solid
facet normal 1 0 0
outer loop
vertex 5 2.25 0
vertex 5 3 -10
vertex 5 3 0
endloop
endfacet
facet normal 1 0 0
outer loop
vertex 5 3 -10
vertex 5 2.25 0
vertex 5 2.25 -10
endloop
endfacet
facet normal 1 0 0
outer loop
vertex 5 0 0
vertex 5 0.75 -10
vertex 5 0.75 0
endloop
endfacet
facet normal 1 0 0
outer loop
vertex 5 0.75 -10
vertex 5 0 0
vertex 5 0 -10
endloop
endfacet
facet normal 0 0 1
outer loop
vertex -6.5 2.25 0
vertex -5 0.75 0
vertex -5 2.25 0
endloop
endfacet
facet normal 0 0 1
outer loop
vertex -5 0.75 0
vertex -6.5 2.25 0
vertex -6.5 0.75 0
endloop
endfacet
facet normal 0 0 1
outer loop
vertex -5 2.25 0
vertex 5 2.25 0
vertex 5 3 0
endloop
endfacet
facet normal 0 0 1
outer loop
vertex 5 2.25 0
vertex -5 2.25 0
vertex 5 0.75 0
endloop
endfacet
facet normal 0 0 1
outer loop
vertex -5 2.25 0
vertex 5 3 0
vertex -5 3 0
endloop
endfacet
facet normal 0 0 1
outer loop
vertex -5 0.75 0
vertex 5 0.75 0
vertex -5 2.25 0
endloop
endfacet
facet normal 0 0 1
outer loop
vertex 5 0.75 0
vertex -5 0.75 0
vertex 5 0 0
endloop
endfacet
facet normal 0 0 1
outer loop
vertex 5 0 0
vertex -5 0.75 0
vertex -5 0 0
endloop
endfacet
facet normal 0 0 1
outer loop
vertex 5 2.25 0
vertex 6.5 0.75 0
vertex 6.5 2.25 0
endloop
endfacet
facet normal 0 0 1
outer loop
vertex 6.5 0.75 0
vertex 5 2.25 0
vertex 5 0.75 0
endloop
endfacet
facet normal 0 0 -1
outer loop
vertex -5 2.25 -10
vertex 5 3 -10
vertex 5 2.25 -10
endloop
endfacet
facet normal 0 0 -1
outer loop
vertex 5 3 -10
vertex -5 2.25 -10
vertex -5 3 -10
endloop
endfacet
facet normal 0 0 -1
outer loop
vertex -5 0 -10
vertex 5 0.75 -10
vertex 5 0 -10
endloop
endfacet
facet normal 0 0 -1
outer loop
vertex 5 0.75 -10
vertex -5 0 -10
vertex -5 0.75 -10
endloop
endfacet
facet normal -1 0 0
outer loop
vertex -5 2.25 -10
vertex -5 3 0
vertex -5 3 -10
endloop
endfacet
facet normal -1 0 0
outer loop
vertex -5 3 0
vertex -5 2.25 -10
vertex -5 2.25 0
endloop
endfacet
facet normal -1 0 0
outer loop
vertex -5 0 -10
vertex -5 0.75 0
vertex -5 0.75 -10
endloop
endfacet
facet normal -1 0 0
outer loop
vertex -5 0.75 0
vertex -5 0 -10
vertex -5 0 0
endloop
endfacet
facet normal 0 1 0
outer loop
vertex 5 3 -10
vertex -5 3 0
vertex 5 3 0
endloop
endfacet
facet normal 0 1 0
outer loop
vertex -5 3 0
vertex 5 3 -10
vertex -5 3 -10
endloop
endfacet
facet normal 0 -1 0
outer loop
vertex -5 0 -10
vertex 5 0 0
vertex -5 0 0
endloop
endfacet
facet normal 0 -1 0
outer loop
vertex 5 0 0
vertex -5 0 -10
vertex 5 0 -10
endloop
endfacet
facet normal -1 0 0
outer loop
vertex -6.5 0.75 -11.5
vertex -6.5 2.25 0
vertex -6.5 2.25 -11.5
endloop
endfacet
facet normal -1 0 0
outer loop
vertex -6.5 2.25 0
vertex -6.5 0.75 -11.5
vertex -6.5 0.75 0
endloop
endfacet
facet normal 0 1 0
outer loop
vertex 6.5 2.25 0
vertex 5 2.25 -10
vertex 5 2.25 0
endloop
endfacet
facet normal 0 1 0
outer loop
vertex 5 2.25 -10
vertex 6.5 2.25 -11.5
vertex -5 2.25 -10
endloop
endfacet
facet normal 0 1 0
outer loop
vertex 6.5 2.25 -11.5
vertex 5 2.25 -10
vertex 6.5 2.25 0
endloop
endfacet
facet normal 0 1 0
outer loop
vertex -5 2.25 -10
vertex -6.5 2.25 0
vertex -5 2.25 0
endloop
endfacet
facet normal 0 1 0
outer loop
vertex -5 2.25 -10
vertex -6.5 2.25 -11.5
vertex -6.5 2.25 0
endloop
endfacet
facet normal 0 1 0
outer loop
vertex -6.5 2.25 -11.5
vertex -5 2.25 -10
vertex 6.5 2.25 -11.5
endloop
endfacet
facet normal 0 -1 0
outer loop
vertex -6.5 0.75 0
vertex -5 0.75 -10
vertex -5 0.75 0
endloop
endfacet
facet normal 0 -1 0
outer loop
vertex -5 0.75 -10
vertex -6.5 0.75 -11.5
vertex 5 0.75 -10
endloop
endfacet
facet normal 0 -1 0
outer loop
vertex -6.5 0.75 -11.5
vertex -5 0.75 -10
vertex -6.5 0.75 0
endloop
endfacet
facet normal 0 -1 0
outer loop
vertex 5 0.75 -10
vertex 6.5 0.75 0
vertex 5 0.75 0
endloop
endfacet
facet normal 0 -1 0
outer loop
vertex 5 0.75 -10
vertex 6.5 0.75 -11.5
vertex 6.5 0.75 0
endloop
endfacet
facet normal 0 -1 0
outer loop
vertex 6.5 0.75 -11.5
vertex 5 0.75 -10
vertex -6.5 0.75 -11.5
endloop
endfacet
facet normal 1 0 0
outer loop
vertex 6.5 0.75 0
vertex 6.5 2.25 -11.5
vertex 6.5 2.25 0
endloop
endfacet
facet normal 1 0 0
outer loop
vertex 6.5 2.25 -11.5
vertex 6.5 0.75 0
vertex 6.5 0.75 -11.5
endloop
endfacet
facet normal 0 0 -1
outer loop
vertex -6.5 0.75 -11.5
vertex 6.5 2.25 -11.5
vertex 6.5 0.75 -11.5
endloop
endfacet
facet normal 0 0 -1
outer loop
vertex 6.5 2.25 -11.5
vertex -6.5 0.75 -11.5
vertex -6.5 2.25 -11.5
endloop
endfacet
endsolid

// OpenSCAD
// file: window.scad
module left_tongue(height, thickness, tongue_thickness) {
    translate([-tongue_thickness, (thickness-tongue_thickness)/2, 0]) {
        cube([tongue_thickness, tongue_thickness, height]);
    }
}

module right_tongue(height, length, thickness, tongue_thickness) {
    translate([length+tongue_thickness, 0, 0]) {
        left_tongue(
            height=height,
            thickness=thickness,
            tongue_thickness=tongue_thickness
        );
    }
}

module bottom_tongue(height, length, thickness, tongue_thickness) {
    translate([-tongue_thickness, (thickness-tongue_thickness)/2, -tongue_thickness]) {
        cube([length+tongue_thickness*2, tongue_thickness, tongue_thickness]);
    }
}

module window(length, height, thickness, tongue_thickness) {
    translate([-length/2, 0, -height]) {
        cube([length, thickness, height]);

        left_tongue(
            height=height,
            thickness=thickness,
            tongue_thickness=tongue_thickness
        );

        right_tongue(
            height=height,
            length=length,
            thickness=thickness,
            tongue_thickness=tongue_thickness
        );

        bottom_tongue(
            height=height,
            length=length,
            thickness=thickness,
            tongue_thickness=tongue_thickness
        );
    }
}

// call window() adjusted for tolerance
module window_opening(length, height, thickness, tongue_thickness, tongue_tolerance) {
    window(
        length=length,
        height=height,
        thickness=thickness,
        tongue_thickness=tongue_thickness+tongue_tolerance
    );
}
// main file
use <window.scad>

length=10;
height=10;
thickness=3;
tongue_thickness=1;
tongue_tolerance=0.5;

window_opening(
    length=length,
    height=height,
    thickness=thickness,
    tongue_thickness=tongue_thickness,
    tongue_tolerance=tongue_tolerance
);
